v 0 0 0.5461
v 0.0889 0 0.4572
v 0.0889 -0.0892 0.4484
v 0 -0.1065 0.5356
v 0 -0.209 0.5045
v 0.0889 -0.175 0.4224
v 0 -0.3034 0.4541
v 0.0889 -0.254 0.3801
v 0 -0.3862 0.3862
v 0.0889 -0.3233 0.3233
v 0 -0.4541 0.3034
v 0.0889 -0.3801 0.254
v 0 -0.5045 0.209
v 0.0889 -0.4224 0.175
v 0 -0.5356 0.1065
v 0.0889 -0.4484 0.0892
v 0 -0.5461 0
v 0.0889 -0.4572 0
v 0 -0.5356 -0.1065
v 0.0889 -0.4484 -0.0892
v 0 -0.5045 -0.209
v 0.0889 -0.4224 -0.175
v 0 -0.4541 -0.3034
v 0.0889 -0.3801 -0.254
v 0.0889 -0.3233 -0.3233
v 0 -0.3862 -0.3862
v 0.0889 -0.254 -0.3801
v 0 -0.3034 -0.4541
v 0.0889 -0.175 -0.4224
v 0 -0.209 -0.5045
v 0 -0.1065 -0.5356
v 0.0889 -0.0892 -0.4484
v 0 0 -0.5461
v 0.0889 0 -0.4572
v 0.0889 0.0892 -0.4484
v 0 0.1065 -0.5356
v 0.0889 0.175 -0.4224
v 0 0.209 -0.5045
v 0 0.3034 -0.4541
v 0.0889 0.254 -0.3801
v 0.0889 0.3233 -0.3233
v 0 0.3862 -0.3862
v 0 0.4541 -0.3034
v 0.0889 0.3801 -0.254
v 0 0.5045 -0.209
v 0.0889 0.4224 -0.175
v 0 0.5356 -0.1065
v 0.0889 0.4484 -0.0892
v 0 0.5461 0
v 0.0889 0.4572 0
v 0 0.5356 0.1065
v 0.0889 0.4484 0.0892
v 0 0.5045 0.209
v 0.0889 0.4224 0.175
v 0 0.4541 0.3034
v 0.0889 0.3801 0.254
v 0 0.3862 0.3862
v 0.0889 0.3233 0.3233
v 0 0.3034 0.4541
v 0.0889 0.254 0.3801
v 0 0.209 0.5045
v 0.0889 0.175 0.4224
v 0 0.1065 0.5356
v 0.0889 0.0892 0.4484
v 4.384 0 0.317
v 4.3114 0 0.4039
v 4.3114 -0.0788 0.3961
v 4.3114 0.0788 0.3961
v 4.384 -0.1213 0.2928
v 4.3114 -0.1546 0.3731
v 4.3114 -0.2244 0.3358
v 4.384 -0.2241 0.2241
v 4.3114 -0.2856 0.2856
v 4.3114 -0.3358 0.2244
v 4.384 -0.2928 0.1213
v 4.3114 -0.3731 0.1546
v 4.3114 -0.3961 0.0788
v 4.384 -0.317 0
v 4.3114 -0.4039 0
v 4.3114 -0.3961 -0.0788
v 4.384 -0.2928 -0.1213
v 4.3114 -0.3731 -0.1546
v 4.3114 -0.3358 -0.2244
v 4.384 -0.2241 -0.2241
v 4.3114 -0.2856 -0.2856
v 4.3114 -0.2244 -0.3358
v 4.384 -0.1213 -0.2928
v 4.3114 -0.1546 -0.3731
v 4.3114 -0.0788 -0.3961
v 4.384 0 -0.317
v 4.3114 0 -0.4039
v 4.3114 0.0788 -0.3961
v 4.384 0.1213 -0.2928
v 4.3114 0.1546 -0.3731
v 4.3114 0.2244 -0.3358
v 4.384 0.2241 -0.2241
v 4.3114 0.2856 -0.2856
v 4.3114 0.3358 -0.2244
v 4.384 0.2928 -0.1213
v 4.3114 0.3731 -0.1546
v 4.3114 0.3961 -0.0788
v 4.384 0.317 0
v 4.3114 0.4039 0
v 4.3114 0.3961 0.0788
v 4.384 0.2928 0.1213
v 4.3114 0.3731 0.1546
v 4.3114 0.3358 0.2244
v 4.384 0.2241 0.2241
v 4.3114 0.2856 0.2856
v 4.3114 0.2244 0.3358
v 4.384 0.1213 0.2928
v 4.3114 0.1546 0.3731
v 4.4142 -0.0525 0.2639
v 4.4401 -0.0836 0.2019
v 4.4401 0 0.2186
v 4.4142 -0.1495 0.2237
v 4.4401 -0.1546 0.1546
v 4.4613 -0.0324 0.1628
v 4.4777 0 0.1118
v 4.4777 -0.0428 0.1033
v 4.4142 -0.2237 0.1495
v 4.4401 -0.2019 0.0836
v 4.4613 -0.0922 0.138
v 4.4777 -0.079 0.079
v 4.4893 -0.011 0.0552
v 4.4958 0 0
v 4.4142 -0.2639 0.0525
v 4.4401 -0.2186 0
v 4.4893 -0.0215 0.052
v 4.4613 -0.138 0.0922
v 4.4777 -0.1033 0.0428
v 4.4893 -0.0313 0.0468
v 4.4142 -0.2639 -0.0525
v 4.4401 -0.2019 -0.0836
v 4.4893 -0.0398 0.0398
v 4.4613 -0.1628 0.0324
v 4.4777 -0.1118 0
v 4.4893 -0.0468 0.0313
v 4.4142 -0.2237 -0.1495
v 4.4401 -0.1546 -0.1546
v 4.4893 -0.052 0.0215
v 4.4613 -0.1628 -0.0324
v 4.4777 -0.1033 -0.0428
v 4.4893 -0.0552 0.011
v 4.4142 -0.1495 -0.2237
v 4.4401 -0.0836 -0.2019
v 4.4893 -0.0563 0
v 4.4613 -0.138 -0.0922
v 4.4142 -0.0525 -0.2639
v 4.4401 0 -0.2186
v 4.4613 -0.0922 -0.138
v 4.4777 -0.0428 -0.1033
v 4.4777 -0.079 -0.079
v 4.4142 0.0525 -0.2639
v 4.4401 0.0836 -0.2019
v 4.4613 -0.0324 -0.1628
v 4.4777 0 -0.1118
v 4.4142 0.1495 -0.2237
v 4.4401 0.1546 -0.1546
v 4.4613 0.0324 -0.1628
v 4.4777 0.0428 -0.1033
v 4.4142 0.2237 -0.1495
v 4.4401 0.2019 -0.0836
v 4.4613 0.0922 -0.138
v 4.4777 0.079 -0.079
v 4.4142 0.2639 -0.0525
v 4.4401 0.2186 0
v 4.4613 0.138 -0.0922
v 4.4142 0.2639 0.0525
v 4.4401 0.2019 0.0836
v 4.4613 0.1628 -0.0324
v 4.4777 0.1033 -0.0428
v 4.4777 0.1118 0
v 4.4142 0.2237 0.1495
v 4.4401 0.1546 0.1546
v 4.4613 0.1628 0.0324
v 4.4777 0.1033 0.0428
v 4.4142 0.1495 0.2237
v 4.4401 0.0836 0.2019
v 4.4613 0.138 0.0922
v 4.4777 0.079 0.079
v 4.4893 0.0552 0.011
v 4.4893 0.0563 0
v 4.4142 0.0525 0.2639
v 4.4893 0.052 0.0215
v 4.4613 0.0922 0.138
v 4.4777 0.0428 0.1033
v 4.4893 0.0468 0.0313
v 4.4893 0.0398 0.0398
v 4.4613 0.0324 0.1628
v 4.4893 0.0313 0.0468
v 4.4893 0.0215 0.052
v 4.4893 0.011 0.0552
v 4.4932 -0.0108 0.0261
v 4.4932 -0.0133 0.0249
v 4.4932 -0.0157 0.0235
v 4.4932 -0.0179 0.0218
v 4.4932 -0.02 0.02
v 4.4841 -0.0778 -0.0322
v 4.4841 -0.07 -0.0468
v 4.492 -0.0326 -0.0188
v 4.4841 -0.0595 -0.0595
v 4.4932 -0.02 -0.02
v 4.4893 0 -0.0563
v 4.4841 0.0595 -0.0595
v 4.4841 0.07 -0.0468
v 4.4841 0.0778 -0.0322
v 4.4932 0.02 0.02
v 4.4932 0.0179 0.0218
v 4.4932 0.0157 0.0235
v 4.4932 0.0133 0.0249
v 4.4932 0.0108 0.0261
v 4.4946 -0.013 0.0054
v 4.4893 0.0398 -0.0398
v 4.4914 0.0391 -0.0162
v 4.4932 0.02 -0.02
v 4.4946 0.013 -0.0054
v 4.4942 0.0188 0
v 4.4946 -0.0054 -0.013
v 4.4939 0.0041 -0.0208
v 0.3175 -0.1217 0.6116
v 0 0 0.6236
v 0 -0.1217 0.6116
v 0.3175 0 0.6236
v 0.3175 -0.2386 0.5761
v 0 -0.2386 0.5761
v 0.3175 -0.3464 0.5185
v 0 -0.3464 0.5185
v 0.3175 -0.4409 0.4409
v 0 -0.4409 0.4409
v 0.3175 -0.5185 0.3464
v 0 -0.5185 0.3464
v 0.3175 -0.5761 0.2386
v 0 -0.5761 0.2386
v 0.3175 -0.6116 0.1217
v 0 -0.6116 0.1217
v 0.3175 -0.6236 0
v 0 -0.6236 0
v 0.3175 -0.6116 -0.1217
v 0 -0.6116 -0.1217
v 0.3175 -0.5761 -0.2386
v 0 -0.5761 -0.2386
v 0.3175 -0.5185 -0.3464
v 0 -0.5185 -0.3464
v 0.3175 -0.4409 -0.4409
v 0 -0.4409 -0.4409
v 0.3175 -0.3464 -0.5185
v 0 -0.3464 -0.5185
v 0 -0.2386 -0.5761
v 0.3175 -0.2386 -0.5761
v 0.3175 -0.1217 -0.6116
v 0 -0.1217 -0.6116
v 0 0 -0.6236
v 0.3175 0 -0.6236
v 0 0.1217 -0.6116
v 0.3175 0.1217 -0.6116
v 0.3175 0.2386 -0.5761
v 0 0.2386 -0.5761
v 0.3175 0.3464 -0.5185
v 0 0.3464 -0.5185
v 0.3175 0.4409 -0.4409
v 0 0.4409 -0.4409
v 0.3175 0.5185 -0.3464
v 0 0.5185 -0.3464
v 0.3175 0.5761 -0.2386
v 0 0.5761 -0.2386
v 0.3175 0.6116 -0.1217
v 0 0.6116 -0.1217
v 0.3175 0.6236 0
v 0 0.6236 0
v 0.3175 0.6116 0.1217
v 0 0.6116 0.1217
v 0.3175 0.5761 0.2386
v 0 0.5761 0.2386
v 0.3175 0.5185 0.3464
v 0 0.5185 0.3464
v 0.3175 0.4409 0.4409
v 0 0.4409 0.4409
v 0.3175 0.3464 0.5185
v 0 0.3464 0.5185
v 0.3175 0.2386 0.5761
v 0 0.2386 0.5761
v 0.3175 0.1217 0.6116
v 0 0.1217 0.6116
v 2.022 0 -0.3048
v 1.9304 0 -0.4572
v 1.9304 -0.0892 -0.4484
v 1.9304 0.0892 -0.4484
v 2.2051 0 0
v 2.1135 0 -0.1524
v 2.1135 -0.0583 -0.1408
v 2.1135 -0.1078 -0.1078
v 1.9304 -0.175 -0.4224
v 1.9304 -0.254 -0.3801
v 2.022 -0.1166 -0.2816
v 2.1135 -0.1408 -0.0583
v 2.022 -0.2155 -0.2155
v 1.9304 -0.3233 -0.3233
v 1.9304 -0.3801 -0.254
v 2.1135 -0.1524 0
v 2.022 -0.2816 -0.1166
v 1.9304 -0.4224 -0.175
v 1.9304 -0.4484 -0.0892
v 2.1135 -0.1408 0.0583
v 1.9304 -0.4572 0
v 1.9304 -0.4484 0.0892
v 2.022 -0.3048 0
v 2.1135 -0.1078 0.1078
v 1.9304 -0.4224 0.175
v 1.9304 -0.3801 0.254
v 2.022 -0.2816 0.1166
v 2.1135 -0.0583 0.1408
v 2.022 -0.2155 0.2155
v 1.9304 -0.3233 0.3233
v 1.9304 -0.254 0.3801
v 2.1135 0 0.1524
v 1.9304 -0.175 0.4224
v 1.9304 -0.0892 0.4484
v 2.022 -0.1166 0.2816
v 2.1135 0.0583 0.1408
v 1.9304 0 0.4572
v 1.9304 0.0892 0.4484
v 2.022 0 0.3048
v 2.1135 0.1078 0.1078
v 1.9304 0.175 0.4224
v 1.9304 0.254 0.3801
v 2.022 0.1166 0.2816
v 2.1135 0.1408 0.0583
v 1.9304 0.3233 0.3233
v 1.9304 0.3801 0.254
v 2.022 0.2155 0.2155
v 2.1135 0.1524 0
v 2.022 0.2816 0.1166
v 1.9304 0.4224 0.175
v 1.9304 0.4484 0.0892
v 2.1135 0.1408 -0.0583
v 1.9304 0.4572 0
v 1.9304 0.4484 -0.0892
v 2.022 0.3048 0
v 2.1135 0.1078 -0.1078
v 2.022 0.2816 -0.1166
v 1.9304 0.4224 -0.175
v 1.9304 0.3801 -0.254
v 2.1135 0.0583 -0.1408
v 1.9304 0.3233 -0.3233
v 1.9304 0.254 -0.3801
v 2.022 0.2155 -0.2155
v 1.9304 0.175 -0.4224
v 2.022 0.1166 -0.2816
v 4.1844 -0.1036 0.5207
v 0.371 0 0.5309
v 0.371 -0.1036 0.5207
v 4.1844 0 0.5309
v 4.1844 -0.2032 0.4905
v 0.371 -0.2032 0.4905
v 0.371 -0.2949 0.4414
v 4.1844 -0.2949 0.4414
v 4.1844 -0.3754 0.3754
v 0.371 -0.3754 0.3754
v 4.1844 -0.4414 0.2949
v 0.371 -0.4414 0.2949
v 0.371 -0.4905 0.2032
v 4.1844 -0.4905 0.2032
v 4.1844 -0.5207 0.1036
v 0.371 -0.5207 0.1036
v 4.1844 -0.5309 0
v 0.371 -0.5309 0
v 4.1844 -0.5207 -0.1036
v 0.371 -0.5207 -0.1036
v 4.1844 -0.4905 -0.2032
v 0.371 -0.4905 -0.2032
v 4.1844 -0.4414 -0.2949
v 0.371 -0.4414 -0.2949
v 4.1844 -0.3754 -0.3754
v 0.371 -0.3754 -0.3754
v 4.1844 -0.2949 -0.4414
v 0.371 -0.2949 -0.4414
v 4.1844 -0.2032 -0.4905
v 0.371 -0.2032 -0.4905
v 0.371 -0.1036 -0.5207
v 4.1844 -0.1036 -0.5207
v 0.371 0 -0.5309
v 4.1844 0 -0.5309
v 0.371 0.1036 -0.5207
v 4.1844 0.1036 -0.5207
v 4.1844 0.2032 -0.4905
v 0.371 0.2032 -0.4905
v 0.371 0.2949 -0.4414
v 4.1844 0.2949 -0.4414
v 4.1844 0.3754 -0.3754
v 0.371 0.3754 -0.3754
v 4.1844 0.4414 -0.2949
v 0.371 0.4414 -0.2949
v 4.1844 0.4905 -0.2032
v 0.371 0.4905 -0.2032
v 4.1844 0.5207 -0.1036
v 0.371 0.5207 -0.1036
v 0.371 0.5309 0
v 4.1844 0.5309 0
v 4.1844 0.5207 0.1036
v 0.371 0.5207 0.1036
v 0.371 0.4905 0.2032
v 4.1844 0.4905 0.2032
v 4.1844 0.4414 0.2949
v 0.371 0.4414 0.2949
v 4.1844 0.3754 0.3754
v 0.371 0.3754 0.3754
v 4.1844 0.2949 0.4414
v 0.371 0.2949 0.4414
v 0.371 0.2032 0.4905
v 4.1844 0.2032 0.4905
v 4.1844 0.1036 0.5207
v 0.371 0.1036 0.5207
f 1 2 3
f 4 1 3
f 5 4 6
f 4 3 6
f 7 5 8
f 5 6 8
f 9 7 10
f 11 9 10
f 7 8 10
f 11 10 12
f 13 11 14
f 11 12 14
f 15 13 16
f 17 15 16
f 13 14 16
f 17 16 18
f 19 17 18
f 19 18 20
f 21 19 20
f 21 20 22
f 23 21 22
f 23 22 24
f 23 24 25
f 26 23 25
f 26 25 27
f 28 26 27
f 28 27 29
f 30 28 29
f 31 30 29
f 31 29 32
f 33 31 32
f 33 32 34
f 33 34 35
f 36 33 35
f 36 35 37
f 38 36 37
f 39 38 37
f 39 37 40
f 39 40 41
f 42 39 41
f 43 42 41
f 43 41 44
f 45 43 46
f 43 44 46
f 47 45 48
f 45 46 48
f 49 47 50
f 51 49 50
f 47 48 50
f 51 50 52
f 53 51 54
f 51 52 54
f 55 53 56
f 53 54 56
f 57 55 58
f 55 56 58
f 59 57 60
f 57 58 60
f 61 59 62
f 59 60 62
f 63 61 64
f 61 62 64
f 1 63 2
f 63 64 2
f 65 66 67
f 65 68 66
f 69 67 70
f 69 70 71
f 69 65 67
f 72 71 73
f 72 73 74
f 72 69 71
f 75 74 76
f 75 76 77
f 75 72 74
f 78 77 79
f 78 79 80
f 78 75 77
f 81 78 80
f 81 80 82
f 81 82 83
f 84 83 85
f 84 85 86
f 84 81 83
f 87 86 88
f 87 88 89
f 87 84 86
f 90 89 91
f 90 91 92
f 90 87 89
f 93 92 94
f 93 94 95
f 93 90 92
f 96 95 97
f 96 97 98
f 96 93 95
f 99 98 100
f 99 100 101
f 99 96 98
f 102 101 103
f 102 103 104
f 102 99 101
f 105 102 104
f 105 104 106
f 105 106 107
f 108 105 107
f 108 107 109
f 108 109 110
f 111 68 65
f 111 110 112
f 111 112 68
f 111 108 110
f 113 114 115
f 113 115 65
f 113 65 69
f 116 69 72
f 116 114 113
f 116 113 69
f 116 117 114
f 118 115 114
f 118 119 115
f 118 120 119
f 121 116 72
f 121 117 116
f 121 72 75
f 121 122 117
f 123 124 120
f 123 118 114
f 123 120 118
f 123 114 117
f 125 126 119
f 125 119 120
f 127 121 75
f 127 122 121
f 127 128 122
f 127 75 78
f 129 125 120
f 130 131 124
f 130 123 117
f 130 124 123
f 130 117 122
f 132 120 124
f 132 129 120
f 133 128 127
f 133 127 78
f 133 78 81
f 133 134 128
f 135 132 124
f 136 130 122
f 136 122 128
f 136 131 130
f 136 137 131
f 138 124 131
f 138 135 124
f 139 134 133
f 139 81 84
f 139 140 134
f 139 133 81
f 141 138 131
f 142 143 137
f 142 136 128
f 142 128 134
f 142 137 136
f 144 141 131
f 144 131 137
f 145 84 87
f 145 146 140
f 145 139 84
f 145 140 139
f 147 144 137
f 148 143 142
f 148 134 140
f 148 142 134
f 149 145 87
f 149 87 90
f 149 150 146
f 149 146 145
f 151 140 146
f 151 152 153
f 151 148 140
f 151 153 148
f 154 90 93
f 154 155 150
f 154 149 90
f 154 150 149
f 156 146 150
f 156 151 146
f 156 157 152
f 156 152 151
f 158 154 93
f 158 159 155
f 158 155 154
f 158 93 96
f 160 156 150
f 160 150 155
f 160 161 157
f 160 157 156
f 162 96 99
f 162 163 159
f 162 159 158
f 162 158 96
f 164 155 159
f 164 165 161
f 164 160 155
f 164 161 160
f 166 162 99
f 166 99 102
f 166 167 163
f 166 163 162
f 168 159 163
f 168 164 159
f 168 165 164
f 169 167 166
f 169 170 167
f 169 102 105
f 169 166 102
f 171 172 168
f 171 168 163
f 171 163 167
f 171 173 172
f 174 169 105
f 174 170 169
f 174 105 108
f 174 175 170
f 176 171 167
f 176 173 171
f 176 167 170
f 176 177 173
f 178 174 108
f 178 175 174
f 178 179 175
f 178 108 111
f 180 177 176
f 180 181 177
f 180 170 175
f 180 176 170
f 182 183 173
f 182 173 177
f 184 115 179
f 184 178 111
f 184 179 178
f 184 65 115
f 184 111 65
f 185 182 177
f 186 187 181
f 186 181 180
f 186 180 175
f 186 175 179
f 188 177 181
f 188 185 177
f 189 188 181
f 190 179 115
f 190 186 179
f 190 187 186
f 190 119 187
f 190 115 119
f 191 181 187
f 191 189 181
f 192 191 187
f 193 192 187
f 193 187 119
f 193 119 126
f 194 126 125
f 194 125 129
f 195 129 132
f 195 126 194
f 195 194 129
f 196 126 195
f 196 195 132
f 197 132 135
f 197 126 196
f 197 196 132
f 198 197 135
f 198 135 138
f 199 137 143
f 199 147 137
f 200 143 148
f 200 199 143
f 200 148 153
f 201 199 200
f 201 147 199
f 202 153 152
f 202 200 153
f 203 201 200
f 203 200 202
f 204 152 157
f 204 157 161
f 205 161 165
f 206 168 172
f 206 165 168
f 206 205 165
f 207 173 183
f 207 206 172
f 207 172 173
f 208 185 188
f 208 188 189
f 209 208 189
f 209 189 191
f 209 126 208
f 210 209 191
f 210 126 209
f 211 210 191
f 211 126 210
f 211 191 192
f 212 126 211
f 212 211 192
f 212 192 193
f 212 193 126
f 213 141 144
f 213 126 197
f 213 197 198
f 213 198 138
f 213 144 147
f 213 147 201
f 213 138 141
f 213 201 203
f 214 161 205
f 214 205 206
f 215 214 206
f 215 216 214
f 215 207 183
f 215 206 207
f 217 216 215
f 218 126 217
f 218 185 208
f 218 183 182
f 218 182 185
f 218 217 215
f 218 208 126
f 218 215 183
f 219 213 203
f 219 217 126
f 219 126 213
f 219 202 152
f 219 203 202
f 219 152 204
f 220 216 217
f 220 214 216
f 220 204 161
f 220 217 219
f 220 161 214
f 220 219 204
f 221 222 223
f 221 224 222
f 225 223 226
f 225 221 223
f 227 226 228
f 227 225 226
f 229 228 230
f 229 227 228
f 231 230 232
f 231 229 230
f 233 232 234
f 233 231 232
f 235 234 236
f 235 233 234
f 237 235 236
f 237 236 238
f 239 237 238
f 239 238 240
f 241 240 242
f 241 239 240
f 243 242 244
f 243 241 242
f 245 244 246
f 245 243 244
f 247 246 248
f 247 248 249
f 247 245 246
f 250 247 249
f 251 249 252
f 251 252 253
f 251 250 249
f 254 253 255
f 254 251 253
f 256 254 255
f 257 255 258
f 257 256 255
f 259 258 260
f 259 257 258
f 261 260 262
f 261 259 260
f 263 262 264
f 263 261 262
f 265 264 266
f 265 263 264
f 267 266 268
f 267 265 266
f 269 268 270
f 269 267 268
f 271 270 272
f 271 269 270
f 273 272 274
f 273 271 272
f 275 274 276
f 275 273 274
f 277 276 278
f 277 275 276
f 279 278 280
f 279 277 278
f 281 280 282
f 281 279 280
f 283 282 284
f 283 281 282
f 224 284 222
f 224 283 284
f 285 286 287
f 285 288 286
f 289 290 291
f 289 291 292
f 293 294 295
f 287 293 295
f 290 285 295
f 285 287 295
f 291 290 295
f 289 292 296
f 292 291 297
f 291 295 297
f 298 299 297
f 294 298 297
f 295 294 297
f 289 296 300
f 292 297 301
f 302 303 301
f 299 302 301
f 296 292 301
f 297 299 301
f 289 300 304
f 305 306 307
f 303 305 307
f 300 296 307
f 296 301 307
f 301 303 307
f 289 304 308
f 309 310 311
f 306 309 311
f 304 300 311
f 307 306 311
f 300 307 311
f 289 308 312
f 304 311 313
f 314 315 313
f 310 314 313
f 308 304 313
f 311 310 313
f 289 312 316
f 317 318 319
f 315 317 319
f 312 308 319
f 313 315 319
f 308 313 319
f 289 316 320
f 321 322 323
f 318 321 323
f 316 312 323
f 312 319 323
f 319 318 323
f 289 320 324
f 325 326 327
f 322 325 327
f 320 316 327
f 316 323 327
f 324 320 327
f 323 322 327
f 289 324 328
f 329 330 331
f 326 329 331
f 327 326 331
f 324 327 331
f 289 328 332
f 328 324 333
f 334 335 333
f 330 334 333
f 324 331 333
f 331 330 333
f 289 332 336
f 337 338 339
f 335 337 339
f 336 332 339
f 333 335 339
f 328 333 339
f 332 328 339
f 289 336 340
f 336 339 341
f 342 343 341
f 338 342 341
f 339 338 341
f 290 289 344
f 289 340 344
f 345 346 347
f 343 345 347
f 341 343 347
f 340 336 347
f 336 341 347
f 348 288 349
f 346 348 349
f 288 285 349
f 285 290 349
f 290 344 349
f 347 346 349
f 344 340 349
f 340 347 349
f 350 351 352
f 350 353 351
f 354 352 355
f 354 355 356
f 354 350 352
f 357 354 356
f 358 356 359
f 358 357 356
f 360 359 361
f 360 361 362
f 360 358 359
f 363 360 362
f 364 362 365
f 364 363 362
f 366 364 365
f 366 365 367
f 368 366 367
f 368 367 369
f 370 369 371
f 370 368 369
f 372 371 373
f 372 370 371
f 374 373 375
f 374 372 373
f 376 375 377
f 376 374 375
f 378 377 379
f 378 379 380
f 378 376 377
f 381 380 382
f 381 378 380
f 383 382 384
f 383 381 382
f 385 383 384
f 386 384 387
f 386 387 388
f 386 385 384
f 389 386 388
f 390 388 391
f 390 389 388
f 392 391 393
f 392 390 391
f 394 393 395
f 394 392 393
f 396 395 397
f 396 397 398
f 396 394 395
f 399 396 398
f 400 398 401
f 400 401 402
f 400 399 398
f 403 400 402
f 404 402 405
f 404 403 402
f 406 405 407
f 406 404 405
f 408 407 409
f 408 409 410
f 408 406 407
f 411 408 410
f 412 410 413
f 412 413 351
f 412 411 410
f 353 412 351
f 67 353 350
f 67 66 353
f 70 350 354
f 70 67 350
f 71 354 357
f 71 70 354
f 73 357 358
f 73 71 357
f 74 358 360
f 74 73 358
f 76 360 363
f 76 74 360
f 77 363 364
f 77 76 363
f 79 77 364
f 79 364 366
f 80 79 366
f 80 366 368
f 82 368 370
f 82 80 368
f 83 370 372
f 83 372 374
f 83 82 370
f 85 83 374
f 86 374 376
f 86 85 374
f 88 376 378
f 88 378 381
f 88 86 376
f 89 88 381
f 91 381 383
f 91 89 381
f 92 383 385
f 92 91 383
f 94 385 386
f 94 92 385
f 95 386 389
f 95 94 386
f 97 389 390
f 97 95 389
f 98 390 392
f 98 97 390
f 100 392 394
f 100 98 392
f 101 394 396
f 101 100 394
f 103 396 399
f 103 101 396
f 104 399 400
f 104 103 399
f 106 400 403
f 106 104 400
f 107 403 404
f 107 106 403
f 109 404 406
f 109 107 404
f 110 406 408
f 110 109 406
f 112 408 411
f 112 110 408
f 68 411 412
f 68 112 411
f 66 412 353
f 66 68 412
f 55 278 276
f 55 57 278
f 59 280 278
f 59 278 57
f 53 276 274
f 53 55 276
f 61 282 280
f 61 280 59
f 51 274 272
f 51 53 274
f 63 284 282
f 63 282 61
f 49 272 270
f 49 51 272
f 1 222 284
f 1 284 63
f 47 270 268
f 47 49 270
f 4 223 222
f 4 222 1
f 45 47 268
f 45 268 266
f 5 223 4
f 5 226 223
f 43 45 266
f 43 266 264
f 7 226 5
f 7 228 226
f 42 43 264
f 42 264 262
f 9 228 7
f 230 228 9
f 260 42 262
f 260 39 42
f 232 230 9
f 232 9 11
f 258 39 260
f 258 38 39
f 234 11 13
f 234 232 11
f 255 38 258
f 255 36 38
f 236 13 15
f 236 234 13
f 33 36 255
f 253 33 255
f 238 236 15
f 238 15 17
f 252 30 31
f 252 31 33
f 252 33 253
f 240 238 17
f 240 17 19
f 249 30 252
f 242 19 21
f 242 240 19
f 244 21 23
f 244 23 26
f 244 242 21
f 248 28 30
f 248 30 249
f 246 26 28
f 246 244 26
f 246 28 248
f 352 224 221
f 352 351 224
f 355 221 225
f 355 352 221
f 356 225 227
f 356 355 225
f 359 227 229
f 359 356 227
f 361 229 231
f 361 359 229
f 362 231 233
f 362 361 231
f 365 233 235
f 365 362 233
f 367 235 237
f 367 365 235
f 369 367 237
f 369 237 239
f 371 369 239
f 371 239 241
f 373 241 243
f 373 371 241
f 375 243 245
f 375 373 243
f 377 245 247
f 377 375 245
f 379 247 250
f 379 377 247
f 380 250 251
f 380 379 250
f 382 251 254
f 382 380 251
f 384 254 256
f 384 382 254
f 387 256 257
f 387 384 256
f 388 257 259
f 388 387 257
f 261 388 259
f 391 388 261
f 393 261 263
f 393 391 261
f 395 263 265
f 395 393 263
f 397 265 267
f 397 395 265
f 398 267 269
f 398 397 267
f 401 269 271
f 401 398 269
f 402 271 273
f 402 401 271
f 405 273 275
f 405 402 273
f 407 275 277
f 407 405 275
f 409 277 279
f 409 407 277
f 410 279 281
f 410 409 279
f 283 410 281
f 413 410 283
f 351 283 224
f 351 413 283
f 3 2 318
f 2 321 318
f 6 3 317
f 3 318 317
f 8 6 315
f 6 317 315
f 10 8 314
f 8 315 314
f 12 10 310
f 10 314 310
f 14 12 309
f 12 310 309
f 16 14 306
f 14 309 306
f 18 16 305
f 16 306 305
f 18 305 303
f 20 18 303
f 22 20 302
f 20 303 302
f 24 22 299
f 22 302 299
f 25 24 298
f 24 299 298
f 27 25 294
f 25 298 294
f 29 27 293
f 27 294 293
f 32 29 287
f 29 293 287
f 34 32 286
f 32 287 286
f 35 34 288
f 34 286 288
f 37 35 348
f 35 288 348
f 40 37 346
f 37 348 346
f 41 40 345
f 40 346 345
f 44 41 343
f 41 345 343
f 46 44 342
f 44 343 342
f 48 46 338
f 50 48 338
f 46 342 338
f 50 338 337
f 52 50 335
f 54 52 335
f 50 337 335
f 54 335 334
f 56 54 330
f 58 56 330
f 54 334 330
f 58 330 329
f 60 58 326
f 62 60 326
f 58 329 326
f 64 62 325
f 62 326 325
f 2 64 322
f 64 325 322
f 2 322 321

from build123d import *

# Parameters (mm, degrees)
HOLE2_D           = 0.9144
HOLE2_DEPTH       = 1.9304
HOLE2_CSINK_D     = 1.0922
HOLE2_CSINK_ANGLE = 90
HOLE2_TIP         = 0.274713475


with BuildPart() as part:
    # Sketch1 → RevolutionAngle1 (revolve)
    with BuildSketch(Plane.XY, mode=Mode.PRIVATE) as revolutionangle1_sk:
        with BuildLine():
            Line((0, 0), (0, 0.62357))
            Line((0, 0.62357), (0.3175, 0.62357))
            Line((0.3175, 0.62357), (0.371026143, 0.53086))
            Line((0.371026143, 0.53086), (4.184420176, 0.53086))
            Line((4.184420176, 0.53086), (4.311420176, 0.40386))
            ThreePointArc((4.311420176, 0.40386), (4.440054413, 0.218568435), (4.4958, 0))
            Line((4.4958, 0), (0, 0))
        make_face()
    revolve(revolutionangle1_sk.sketch.rotate(Axis((0, 0, 0), (1, 0, 0)), 90), axis=Axis((0, 0, 0), (1, 0, 0)))

    # Hole2
    with Locations(Plane(origin=(0, 0, 0), x_dir=(0, 0, -1), z_dir=(-1, 0, 0))):
        with Locations((0, 0)):
            CounterSinkHole(HOLE2_D / 2, HOLE2_CSINK_D / 2, depth=HOLE2_DEPTH, counter_sink_angle=HOLE2_CSINK_ANGLE)
            with Locations((0, 0, -(HOLE2_DEPTH + HOLE2_TIP / 2))):  # 118° drill point
                Cone(0, HOLE2_D / 2, HOLE2_TIP, mode=Mode.SUBTRACT)


solid = part.part
